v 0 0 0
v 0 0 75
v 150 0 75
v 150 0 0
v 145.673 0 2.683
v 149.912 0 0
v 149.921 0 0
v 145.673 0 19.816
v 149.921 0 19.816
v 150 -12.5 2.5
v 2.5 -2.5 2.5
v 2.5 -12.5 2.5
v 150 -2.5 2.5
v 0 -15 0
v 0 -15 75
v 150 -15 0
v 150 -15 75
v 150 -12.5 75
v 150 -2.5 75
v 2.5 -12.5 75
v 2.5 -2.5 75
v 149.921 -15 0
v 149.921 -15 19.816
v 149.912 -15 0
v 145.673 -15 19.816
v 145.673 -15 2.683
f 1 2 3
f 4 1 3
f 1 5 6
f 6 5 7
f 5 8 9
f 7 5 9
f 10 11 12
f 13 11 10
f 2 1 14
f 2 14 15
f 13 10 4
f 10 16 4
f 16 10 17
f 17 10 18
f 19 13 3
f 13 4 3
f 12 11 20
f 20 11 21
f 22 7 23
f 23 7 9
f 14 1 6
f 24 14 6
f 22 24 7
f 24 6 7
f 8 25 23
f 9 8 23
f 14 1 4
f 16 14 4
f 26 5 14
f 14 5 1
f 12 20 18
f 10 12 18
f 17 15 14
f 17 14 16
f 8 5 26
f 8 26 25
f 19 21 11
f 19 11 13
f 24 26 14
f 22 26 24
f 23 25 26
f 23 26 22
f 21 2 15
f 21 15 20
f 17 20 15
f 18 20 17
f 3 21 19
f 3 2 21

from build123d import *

# Parameters (mm, degrees)
F0_W     = 150
F0_H     = 75
F1_DEPTH = 15
F2_T     = -2.5
F4_DEPTH = 15
F5_W     = 4.2480379343
F5_H     = 19.8161639273
F6_DEPTH = 15


with BuildPart() as f1:
    # F0 (on Front) → F1 (new body)
    with BuildSketch(Plane.XZ):
        with Locations((75, 37.5)):
            Rectangle(F0_W, F0_H)
    extrude(amount=F1_DEPTH)

    # F2
    f2_openings = [f1.faces().sort_by_distance(p)[0] for p in [
        (75, -7.5, 75),
        (150, -7.5, 37.5),
    ]]
    offset(amount=F2_T, openings=f2_openings)


with BuildPart() as f4:
    # F3 (on Front) → F4 (new body)
    with BuildSketch(Plane.XZ):
        Polygon((149.8608291149, 2.7603094932), (0, 0), (149.9116716769, 0), align=None)
    extrude(amount=F4_DEPTH)

    # F5 (on face) → F6 (join)
    with BuildSketch(Plane.XZ):
        with Locations((147.7968916297, 9.9080819637)):
            Rectangle(F5_W, F5_H)
    extrude(amount=F6_DEPTH)


solid = Compound([f1.part, f4.part])
